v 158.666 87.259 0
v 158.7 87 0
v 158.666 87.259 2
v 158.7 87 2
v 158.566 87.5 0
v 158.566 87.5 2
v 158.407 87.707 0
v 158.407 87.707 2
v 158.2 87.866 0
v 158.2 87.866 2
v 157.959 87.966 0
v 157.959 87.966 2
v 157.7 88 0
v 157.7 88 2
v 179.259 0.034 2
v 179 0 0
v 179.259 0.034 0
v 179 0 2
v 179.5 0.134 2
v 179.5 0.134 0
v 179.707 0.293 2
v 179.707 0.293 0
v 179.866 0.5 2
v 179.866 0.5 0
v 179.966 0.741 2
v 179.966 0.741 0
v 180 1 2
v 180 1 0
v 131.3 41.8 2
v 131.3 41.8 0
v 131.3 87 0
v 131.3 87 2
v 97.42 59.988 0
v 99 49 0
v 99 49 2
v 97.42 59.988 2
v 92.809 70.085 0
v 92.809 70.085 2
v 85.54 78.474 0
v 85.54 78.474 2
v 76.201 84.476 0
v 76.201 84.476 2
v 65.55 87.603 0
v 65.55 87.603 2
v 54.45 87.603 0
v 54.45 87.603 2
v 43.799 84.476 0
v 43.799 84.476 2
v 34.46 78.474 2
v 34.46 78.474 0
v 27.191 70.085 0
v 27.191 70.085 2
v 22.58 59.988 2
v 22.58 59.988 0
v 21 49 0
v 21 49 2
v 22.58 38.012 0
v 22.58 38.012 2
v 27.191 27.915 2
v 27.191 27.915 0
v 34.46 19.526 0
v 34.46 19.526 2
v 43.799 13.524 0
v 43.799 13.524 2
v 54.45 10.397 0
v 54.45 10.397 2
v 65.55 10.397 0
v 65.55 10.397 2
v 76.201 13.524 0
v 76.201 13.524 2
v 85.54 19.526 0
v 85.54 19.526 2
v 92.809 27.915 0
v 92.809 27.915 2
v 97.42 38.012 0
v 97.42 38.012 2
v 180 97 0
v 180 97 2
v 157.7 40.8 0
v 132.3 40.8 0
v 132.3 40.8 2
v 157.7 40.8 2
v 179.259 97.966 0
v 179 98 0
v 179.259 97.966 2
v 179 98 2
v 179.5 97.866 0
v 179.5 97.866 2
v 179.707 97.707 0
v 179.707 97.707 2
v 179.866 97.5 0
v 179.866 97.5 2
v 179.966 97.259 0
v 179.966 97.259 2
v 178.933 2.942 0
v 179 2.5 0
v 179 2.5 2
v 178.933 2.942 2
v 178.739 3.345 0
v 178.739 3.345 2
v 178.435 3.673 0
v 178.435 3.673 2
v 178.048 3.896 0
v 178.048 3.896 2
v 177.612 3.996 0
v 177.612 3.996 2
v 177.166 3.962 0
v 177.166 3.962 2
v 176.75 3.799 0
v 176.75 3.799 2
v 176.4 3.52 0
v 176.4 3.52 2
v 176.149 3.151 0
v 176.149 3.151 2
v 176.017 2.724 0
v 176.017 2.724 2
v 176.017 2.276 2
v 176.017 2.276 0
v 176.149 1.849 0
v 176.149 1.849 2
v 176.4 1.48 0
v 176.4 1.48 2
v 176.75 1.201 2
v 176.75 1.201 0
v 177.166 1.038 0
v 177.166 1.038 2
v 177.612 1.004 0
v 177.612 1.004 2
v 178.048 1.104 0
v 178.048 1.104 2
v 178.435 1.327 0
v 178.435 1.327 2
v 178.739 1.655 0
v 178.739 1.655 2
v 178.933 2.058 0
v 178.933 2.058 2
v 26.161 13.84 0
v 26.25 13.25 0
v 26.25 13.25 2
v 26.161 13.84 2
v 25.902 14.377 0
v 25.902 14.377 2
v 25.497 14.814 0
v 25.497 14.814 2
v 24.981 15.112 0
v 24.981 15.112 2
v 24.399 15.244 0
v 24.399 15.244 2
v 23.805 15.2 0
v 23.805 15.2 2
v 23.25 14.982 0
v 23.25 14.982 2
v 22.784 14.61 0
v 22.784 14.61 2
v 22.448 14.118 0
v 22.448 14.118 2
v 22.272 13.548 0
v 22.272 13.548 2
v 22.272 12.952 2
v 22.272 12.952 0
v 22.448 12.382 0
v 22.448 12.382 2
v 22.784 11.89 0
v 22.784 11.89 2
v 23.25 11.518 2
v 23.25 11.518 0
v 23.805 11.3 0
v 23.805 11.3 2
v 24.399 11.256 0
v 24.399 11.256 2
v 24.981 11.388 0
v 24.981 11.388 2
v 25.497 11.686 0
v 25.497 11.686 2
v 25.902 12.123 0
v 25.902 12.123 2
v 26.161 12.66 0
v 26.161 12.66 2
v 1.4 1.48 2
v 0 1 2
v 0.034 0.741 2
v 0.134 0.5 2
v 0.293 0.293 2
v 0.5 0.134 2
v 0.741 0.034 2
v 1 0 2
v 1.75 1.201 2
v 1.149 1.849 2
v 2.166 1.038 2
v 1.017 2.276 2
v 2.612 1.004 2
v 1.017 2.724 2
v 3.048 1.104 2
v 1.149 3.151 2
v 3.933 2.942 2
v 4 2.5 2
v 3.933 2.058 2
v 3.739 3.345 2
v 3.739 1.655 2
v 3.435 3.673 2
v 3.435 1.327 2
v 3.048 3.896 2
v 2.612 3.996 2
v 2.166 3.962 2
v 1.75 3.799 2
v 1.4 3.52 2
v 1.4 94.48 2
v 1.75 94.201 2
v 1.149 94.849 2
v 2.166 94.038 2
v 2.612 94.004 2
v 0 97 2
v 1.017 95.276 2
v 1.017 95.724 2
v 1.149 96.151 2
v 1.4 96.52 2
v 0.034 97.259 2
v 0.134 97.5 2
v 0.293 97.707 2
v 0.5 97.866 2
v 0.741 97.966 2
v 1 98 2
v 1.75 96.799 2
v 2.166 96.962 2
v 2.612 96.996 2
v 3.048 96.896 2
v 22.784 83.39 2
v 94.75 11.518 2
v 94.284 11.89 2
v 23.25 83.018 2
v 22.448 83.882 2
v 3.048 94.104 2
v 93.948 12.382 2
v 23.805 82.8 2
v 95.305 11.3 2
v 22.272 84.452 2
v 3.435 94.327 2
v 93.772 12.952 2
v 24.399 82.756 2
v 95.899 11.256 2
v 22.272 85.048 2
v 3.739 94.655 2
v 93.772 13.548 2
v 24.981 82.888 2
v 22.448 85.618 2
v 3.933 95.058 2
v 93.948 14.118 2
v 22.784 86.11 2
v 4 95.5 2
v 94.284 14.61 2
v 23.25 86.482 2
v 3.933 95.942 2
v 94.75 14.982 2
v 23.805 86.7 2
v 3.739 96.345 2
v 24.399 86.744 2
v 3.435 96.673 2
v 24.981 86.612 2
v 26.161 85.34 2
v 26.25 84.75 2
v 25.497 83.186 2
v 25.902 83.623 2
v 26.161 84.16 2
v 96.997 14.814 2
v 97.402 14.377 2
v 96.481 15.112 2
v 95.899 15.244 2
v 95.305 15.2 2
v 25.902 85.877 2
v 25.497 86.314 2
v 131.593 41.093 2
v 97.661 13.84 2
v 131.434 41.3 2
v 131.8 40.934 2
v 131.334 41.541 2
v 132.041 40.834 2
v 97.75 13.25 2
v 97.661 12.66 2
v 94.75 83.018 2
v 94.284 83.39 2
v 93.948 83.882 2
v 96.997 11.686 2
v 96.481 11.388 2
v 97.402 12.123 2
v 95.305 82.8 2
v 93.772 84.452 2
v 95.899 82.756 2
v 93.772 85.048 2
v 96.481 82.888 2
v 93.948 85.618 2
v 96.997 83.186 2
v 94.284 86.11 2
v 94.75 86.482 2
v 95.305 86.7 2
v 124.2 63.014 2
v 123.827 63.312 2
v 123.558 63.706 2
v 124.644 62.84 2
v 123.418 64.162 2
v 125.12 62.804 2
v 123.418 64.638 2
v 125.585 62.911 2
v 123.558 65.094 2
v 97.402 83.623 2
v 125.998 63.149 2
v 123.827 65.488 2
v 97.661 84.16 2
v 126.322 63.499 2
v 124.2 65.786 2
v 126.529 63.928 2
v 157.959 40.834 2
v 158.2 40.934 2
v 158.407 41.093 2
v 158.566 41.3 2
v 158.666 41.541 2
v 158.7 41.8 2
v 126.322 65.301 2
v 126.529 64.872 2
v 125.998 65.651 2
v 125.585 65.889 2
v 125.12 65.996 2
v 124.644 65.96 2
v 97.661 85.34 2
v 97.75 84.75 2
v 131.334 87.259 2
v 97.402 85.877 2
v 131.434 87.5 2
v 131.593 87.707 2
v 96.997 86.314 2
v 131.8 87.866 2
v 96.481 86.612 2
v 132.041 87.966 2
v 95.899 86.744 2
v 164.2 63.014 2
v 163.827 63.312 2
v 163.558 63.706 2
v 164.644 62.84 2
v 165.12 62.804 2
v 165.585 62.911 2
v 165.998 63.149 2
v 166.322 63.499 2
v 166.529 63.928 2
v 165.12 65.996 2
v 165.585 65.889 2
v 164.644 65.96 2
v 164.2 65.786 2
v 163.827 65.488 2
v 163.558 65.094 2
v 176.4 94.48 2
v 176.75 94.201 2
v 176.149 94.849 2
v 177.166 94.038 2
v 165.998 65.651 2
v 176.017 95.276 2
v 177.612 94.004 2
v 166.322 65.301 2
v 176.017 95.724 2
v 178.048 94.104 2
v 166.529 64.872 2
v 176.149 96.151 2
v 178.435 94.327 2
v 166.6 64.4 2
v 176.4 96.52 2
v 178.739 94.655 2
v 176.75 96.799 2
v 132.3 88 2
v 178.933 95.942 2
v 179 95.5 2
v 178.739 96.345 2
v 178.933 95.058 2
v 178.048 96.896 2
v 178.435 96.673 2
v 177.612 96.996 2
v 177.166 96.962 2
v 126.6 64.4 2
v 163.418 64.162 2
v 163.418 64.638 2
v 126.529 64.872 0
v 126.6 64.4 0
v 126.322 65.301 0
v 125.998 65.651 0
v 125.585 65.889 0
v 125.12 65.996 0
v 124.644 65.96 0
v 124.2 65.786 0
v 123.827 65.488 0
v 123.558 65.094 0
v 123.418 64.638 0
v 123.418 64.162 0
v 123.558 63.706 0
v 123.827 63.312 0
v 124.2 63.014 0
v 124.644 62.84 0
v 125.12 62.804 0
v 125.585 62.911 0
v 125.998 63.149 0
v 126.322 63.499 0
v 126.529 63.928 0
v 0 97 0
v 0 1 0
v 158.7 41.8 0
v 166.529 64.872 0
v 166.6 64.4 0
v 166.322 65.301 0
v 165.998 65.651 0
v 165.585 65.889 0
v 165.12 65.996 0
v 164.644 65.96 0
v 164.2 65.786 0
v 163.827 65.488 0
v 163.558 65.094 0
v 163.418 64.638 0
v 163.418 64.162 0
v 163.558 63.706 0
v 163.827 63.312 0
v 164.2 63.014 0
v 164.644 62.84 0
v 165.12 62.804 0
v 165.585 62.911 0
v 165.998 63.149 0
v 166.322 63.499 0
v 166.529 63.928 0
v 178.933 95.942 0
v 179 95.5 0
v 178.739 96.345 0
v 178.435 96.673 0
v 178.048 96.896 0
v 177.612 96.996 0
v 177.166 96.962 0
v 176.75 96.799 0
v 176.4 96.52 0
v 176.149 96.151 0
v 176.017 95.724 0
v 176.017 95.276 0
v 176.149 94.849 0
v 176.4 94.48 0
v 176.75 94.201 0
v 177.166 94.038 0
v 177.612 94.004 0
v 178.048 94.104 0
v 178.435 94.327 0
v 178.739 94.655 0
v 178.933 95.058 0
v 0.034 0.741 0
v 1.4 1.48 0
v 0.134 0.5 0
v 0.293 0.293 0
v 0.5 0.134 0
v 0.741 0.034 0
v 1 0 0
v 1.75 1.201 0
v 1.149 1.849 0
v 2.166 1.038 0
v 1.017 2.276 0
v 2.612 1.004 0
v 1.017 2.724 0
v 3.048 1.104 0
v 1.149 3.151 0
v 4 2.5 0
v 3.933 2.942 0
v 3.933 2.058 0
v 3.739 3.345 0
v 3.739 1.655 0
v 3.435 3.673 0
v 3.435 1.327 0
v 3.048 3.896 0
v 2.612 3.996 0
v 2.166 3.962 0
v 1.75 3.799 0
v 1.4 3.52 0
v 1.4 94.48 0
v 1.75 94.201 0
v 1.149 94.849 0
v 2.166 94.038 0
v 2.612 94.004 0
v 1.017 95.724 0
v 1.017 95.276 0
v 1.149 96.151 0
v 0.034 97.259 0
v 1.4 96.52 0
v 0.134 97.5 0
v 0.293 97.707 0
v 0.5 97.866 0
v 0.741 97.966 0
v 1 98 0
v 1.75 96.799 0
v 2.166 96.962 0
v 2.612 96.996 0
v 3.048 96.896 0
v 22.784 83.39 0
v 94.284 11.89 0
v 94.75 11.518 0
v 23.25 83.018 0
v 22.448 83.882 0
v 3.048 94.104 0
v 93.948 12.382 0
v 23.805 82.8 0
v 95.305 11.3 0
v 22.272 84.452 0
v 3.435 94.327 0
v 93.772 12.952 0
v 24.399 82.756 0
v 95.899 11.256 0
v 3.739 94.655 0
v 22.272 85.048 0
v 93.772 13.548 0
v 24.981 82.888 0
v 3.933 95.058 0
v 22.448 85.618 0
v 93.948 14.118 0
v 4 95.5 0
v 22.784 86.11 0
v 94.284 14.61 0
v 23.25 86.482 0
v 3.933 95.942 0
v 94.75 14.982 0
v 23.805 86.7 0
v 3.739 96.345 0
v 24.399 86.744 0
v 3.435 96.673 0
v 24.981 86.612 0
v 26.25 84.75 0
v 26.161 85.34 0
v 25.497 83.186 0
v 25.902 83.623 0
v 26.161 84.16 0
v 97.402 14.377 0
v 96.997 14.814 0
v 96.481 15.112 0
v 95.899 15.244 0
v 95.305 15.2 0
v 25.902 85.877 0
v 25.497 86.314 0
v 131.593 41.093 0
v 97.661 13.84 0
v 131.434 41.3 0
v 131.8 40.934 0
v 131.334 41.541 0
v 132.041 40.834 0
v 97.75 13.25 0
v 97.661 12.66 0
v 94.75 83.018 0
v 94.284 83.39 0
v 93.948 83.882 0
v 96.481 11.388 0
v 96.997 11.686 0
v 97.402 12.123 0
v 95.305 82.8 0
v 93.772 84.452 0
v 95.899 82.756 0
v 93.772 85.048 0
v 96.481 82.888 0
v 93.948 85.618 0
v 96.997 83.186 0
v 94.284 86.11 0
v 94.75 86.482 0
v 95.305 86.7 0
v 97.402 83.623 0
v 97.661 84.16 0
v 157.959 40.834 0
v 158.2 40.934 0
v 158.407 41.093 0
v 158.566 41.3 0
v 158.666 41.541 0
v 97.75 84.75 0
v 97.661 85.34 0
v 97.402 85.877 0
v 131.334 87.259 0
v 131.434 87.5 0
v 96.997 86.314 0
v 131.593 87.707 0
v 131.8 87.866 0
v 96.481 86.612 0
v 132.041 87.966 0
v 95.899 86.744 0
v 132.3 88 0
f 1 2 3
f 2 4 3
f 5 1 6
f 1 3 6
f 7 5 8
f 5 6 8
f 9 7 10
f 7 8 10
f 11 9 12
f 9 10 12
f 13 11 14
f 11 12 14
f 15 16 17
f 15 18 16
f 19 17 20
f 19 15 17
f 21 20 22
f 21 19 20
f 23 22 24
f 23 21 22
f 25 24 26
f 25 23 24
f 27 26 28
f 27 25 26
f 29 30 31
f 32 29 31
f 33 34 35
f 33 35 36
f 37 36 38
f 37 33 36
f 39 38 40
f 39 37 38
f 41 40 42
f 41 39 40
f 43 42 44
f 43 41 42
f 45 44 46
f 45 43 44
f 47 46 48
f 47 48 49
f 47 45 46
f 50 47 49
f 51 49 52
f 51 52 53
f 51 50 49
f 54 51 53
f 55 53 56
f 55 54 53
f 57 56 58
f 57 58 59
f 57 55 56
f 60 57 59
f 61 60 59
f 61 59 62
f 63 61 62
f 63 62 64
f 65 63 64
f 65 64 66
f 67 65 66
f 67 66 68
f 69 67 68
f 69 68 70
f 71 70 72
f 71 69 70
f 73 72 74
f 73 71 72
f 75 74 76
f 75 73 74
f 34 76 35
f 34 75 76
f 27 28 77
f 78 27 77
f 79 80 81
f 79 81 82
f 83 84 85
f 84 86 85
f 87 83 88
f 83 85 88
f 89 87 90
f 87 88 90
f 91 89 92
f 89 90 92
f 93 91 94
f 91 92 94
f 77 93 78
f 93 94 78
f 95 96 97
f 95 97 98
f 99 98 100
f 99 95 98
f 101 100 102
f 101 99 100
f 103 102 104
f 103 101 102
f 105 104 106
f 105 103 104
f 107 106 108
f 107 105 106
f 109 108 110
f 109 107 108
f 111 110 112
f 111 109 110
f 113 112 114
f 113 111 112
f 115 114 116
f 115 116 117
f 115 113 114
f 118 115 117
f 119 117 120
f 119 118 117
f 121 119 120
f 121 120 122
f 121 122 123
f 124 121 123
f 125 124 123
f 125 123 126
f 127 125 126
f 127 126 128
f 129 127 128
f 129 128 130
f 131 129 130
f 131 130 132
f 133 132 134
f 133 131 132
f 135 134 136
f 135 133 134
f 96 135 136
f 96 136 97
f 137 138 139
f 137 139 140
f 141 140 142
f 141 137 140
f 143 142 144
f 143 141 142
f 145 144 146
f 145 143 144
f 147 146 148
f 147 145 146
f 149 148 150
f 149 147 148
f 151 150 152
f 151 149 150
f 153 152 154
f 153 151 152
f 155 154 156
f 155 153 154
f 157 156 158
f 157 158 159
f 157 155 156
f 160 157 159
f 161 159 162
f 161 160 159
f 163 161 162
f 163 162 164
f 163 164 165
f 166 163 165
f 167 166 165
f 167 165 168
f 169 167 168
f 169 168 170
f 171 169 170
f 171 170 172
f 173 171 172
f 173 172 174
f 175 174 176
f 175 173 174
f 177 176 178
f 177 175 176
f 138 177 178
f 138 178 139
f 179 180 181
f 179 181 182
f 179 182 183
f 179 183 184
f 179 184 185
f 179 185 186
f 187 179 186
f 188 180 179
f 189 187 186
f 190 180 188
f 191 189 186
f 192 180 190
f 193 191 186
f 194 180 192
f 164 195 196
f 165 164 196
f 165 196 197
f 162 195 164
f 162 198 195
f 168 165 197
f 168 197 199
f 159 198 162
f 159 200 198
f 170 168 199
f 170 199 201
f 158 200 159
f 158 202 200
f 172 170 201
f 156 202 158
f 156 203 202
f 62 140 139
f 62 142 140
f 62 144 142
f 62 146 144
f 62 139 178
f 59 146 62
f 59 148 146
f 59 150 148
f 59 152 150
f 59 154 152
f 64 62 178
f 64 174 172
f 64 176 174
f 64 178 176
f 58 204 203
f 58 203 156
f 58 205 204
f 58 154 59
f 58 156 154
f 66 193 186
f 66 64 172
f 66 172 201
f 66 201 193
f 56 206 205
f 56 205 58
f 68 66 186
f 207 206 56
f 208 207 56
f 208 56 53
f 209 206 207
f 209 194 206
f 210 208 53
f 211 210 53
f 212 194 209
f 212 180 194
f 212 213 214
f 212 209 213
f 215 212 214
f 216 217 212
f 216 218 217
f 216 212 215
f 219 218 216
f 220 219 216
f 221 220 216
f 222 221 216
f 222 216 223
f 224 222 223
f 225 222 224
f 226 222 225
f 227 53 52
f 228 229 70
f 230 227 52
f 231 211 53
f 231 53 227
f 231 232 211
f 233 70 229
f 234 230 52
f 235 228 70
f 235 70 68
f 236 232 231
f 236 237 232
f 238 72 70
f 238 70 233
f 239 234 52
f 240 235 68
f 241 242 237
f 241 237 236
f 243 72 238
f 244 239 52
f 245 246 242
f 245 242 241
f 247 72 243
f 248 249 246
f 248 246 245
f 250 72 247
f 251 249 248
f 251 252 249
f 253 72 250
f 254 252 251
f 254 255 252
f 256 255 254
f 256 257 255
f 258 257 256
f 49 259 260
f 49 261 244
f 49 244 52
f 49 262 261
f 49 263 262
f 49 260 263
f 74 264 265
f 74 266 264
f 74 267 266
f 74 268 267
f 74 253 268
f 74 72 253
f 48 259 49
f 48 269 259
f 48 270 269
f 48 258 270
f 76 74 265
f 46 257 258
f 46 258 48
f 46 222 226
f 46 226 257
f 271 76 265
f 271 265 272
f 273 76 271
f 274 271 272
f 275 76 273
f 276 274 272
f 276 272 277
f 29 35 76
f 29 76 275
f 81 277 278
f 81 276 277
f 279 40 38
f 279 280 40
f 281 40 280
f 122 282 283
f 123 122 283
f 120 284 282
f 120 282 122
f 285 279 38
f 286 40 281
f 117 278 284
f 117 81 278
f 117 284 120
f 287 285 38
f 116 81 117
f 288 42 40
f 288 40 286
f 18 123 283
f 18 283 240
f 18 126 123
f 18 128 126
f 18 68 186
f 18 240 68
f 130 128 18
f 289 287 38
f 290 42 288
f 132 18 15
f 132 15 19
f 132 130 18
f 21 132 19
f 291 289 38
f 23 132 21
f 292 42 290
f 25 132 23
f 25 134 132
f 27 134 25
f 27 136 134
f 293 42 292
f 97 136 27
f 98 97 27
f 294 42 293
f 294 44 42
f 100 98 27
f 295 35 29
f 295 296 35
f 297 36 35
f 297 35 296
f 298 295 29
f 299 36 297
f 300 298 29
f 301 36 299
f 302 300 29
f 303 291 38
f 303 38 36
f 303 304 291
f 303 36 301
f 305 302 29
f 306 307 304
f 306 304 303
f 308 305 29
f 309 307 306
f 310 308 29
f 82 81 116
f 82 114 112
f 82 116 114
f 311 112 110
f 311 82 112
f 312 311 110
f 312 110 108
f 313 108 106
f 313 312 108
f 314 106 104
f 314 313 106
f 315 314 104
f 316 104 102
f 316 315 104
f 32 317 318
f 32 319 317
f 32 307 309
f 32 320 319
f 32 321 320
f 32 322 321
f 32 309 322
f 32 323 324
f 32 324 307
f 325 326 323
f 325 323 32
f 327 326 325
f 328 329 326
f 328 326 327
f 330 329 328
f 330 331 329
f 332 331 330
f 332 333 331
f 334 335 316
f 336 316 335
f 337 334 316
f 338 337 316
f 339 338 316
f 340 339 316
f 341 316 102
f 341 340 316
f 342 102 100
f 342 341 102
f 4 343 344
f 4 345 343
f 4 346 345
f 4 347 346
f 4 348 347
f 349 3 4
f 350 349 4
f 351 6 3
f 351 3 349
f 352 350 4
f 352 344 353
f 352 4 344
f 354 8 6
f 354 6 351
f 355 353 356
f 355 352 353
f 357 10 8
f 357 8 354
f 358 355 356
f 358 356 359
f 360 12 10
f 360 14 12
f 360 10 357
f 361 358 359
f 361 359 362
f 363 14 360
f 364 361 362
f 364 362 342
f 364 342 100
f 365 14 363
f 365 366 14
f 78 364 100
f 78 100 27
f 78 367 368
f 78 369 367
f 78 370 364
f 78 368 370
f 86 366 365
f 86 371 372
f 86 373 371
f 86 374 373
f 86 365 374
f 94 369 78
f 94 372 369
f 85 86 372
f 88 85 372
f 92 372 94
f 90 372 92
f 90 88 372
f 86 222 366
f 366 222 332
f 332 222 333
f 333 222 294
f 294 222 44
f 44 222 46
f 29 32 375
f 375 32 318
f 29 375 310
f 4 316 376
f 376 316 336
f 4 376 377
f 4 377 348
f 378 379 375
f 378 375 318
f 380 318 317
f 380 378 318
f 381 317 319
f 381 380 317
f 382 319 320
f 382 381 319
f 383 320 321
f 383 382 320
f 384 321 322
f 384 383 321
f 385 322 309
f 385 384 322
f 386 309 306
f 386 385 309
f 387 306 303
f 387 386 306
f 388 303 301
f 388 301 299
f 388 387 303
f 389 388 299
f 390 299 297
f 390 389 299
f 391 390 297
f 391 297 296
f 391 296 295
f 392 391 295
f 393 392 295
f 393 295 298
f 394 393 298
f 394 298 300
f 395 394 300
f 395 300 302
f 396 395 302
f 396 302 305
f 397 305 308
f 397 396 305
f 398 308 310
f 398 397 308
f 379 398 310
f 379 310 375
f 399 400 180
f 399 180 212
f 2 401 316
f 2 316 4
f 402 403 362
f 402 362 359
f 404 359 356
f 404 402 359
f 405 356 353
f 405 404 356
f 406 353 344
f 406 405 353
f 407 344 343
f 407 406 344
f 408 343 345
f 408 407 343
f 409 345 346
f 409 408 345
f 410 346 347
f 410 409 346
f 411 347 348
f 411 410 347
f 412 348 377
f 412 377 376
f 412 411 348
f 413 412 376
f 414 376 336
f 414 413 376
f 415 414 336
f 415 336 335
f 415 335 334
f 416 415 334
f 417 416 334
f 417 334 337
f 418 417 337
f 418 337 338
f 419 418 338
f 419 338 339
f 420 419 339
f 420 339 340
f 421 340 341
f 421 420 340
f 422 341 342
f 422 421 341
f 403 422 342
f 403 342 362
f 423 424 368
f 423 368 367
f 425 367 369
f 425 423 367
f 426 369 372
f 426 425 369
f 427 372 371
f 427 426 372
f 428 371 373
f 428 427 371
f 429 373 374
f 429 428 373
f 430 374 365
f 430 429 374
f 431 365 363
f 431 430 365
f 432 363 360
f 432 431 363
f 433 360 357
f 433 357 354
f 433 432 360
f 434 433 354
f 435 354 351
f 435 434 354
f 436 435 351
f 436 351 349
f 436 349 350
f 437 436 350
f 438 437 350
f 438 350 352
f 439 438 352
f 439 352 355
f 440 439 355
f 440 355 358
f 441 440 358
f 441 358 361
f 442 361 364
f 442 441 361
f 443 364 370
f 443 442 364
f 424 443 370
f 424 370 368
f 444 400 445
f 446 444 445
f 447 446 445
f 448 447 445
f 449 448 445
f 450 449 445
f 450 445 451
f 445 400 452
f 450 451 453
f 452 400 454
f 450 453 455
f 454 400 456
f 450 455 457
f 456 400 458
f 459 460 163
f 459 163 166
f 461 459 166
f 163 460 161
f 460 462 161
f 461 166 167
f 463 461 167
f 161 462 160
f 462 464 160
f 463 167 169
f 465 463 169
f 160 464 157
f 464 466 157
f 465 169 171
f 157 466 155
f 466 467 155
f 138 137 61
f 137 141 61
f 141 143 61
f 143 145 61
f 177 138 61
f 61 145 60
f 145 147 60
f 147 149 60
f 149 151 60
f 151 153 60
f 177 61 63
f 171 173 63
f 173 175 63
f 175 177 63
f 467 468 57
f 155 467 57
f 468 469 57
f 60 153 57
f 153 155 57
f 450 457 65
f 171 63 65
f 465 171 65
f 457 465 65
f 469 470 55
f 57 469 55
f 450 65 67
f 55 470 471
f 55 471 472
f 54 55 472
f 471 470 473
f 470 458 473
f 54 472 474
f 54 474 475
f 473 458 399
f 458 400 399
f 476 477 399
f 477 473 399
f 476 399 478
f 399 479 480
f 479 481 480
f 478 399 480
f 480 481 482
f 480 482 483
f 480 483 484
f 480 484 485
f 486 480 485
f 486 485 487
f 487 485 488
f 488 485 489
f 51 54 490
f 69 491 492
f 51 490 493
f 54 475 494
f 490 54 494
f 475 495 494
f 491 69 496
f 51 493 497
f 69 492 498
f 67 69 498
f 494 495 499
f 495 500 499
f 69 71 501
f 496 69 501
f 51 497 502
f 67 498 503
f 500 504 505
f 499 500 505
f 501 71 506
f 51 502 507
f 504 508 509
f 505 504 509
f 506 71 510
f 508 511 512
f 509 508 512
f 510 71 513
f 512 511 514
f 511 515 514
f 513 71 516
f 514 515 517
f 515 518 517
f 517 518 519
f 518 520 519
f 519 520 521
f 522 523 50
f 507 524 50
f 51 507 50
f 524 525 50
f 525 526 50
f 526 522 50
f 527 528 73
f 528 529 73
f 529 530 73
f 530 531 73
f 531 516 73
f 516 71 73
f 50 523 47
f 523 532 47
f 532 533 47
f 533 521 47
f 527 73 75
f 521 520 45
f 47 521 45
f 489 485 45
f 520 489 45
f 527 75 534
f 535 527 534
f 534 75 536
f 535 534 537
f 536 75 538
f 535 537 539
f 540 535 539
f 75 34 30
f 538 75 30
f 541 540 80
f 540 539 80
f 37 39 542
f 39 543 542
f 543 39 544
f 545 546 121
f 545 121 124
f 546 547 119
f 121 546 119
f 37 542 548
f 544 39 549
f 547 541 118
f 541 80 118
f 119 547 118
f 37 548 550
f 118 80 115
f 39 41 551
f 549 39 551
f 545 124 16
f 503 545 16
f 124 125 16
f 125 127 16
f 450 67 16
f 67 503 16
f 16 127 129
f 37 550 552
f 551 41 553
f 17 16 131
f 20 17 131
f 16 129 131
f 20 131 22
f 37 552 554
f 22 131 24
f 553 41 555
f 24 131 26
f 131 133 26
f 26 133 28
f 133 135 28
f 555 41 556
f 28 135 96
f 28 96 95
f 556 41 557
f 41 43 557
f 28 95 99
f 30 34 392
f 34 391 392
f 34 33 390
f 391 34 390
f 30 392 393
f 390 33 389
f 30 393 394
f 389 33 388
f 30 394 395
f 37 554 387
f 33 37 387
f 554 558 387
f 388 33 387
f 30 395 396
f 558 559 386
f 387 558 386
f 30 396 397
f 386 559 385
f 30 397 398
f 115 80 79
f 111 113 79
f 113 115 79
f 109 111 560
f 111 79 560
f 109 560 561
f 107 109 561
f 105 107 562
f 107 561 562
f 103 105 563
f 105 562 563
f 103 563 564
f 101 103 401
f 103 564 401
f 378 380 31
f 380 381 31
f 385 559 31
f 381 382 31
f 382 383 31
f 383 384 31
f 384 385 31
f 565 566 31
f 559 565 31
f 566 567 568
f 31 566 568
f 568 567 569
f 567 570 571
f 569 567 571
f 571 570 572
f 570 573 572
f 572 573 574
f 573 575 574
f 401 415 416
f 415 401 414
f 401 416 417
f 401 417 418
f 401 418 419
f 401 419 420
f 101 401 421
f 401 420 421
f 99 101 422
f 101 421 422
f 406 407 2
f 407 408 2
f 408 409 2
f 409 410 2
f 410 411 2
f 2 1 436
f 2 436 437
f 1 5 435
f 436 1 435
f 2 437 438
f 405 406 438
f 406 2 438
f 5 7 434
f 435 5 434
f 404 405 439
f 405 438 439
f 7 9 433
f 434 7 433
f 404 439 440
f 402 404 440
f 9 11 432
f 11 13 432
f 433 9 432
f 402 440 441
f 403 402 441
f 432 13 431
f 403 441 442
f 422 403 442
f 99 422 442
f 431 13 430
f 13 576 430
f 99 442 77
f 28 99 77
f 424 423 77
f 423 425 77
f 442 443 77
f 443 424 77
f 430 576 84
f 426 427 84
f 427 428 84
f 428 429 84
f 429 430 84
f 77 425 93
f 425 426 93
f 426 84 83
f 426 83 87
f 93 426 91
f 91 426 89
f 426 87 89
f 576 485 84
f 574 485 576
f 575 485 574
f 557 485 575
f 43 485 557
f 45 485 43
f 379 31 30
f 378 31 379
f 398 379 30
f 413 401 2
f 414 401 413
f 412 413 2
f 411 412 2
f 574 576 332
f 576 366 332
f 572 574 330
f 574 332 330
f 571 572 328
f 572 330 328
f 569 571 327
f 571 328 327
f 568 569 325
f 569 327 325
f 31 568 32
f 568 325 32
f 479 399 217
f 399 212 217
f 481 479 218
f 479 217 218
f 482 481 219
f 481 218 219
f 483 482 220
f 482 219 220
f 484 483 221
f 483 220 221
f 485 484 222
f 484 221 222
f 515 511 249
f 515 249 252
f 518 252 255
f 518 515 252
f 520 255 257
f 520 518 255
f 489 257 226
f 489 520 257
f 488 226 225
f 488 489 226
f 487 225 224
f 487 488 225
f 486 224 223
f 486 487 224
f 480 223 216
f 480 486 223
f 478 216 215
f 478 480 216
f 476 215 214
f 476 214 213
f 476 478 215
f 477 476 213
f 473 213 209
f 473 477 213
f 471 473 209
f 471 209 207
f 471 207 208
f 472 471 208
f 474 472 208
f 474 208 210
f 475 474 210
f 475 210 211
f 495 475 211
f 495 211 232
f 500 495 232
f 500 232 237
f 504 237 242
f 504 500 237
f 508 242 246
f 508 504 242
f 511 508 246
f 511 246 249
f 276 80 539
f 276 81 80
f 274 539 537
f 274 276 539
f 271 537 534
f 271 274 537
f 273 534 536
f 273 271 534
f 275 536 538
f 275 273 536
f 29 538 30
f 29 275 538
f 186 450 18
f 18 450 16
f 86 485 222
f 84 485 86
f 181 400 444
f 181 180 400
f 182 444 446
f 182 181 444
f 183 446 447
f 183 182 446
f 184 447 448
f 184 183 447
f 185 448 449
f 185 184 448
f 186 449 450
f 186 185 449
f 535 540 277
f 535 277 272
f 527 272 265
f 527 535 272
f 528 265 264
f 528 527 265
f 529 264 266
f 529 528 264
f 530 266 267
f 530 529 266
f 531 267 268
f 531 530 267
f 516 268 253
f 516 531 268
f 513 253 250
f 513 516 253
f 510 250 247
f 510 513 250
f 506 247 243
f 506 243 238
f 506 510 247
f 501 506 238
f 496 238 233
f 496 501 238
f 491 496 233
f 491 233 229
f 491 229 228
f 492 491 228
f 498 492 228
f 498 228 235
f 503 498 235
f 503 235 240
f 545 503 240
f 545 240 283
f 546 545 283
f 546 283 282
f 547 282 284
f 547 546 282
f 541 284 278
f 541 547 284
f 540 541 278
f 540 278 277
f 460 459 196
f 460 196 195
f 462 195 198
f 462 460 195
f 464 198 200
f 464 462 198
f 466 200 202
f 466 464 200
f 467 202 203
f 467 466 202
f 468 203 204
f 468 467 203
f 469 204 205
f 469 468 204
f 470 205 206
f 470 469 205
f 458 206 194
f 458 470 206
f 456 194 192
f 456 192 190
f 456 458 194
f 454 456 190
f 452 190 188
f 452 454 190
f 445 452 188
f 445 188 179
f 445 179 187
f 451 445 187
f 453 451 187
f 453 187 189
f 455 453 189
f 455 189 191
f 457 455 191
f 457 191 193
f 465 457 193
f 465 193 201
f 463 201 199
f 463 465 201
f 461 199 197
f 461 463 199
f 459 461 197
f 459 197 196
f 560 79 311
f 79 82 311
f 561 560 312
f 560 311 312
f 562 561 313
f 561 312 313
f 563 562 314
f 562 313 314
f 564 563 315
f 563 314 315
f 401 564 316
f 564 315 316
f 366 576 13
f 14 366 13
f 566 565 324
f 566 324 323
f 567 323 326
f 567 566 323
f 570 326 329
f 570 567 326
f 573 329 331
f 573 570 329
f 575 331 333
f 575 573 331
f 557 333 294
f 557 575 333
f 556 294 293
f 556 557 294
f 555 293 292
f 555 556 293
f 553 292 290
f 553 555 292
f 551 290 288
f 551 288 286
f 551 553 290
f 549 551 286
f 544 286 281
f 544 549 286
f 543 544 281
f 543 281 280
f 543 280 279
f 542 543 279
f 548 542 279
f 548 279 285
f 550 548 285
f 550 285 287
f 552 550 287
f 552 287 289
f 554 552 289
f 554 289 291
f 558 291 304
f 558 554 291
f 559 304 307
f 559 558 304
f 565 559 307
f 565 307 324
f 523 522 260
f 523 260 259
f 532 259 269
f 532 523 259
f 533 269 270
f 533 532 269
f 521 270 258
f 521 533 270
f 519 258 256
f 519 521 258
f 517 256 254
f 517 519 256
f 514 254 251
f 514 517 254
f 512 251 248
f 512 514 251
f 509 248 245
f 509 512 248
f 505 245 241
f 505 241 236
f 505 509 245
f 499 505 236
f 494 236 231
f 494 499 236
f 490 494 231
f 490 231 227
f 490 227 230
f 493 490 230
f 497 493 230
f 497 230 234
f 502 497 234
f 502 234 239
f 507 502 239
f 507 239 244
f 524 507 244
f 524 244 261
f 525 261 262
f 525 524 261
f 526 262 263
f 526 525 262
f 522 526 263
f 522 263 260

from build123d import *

# Parameters (mm, degrees)
SKETCH_1_W      = 180
SKETCH_1_H      = 98
SKETCH_1_R      = 1.5
SKETCH_1_R_2    = 39
SKETCH_1_R_3    = 2
SKETCH_1_R_4    = 1.6
SKETCH_1_W_2    = 27.4
SKETCH_1_H_2    = 47.2
EXTRUDE_1_DEPTH = 2
FILLET_1_R      = 1
FILLET_2_R      = 1


with BuildPart() as part:
    # Эскиз1 → Бобышка-Вытянуть1 (new body)
    with BuildSketch(Plane.XY):
        with Locations((90, 49)):
            Rectangle(SKETCH_1_W, SKETCH_1_H)
        with Locations((2.5, 95.5)):
            Circle(SKETCH_1_R, mode=Mode.SUBTRACT)
        with Locations((177.5, 95.5)):
            Circle(SKETCH_1_R, mode=Mode.SUBTRACT)
        with Locations((177.5, 2.5)):
            Circle(SKETCH_1_R, mode=Mode.SUBTRACT)
        with Locations((2.5, 2.5)):
            Circle(SKETCH_1_R, mode=Mode.SUBTRACT)
        with Locations((60, 49)):
            Circle(SKETCH_1_R_2, mode=Mode.SUBTRACT)
        with Locations((24.25, 84.75)):
            Circle(SKETCH_1_R_3, mode=Mode.SUBTRACT)
        with Locations((95.75, 84.75)):
            Circle(SKETCH_1_R_3, mode=Mode.SUBTRACT)
        with Locations((95.75, 13.25)):
            Circle(SKETCH_1_R_3, mode=Mode.SUBTRACT)
        with Locations((24.25, 13.25)):
            Circle(SKETCH_1_R_3, mode=Mode.SUBTRACT)
        with Locations((125, 64.4)):
            Circle(SKETCH_1_R_4, mode=Mode.SUBTRACT)
        with Locations((165, 64.4)):
            Circle(SKETCH_1_R_4, mode=Mode.SUBTRACT)
        with Locations((145, 64.4)):
            Rectangle(SKETCH_1_W_2, SKETCH_1_H_2, mode=Mode.SUBTRACT)
    extrude(amount=EXTRUDE_1_DEPTH)

    # Скругление1
    fillet_1_edges = [part.edges().sort_by_distance(p)[0] for p in [
        (0, 98, 1),
        (180, 98, 1),
        (180, 0, 1),
        (0, 0, 1),
    ]]
    fillet(fillet_1_edges, radius=FILLET_1_R)

    # Скругление2
    fillet_2_edges = [part.edges().sort_by_distance(p)[0] for p in [
        (158.7, 40.8, 1),
        (158.7, 88, 1),
        (131.3, 88, 1),
        (131.3, 40.8, 1),
    ]]
    fillet(fillet_2_edges, radius=FILLET_2_R)


solid = part.part
